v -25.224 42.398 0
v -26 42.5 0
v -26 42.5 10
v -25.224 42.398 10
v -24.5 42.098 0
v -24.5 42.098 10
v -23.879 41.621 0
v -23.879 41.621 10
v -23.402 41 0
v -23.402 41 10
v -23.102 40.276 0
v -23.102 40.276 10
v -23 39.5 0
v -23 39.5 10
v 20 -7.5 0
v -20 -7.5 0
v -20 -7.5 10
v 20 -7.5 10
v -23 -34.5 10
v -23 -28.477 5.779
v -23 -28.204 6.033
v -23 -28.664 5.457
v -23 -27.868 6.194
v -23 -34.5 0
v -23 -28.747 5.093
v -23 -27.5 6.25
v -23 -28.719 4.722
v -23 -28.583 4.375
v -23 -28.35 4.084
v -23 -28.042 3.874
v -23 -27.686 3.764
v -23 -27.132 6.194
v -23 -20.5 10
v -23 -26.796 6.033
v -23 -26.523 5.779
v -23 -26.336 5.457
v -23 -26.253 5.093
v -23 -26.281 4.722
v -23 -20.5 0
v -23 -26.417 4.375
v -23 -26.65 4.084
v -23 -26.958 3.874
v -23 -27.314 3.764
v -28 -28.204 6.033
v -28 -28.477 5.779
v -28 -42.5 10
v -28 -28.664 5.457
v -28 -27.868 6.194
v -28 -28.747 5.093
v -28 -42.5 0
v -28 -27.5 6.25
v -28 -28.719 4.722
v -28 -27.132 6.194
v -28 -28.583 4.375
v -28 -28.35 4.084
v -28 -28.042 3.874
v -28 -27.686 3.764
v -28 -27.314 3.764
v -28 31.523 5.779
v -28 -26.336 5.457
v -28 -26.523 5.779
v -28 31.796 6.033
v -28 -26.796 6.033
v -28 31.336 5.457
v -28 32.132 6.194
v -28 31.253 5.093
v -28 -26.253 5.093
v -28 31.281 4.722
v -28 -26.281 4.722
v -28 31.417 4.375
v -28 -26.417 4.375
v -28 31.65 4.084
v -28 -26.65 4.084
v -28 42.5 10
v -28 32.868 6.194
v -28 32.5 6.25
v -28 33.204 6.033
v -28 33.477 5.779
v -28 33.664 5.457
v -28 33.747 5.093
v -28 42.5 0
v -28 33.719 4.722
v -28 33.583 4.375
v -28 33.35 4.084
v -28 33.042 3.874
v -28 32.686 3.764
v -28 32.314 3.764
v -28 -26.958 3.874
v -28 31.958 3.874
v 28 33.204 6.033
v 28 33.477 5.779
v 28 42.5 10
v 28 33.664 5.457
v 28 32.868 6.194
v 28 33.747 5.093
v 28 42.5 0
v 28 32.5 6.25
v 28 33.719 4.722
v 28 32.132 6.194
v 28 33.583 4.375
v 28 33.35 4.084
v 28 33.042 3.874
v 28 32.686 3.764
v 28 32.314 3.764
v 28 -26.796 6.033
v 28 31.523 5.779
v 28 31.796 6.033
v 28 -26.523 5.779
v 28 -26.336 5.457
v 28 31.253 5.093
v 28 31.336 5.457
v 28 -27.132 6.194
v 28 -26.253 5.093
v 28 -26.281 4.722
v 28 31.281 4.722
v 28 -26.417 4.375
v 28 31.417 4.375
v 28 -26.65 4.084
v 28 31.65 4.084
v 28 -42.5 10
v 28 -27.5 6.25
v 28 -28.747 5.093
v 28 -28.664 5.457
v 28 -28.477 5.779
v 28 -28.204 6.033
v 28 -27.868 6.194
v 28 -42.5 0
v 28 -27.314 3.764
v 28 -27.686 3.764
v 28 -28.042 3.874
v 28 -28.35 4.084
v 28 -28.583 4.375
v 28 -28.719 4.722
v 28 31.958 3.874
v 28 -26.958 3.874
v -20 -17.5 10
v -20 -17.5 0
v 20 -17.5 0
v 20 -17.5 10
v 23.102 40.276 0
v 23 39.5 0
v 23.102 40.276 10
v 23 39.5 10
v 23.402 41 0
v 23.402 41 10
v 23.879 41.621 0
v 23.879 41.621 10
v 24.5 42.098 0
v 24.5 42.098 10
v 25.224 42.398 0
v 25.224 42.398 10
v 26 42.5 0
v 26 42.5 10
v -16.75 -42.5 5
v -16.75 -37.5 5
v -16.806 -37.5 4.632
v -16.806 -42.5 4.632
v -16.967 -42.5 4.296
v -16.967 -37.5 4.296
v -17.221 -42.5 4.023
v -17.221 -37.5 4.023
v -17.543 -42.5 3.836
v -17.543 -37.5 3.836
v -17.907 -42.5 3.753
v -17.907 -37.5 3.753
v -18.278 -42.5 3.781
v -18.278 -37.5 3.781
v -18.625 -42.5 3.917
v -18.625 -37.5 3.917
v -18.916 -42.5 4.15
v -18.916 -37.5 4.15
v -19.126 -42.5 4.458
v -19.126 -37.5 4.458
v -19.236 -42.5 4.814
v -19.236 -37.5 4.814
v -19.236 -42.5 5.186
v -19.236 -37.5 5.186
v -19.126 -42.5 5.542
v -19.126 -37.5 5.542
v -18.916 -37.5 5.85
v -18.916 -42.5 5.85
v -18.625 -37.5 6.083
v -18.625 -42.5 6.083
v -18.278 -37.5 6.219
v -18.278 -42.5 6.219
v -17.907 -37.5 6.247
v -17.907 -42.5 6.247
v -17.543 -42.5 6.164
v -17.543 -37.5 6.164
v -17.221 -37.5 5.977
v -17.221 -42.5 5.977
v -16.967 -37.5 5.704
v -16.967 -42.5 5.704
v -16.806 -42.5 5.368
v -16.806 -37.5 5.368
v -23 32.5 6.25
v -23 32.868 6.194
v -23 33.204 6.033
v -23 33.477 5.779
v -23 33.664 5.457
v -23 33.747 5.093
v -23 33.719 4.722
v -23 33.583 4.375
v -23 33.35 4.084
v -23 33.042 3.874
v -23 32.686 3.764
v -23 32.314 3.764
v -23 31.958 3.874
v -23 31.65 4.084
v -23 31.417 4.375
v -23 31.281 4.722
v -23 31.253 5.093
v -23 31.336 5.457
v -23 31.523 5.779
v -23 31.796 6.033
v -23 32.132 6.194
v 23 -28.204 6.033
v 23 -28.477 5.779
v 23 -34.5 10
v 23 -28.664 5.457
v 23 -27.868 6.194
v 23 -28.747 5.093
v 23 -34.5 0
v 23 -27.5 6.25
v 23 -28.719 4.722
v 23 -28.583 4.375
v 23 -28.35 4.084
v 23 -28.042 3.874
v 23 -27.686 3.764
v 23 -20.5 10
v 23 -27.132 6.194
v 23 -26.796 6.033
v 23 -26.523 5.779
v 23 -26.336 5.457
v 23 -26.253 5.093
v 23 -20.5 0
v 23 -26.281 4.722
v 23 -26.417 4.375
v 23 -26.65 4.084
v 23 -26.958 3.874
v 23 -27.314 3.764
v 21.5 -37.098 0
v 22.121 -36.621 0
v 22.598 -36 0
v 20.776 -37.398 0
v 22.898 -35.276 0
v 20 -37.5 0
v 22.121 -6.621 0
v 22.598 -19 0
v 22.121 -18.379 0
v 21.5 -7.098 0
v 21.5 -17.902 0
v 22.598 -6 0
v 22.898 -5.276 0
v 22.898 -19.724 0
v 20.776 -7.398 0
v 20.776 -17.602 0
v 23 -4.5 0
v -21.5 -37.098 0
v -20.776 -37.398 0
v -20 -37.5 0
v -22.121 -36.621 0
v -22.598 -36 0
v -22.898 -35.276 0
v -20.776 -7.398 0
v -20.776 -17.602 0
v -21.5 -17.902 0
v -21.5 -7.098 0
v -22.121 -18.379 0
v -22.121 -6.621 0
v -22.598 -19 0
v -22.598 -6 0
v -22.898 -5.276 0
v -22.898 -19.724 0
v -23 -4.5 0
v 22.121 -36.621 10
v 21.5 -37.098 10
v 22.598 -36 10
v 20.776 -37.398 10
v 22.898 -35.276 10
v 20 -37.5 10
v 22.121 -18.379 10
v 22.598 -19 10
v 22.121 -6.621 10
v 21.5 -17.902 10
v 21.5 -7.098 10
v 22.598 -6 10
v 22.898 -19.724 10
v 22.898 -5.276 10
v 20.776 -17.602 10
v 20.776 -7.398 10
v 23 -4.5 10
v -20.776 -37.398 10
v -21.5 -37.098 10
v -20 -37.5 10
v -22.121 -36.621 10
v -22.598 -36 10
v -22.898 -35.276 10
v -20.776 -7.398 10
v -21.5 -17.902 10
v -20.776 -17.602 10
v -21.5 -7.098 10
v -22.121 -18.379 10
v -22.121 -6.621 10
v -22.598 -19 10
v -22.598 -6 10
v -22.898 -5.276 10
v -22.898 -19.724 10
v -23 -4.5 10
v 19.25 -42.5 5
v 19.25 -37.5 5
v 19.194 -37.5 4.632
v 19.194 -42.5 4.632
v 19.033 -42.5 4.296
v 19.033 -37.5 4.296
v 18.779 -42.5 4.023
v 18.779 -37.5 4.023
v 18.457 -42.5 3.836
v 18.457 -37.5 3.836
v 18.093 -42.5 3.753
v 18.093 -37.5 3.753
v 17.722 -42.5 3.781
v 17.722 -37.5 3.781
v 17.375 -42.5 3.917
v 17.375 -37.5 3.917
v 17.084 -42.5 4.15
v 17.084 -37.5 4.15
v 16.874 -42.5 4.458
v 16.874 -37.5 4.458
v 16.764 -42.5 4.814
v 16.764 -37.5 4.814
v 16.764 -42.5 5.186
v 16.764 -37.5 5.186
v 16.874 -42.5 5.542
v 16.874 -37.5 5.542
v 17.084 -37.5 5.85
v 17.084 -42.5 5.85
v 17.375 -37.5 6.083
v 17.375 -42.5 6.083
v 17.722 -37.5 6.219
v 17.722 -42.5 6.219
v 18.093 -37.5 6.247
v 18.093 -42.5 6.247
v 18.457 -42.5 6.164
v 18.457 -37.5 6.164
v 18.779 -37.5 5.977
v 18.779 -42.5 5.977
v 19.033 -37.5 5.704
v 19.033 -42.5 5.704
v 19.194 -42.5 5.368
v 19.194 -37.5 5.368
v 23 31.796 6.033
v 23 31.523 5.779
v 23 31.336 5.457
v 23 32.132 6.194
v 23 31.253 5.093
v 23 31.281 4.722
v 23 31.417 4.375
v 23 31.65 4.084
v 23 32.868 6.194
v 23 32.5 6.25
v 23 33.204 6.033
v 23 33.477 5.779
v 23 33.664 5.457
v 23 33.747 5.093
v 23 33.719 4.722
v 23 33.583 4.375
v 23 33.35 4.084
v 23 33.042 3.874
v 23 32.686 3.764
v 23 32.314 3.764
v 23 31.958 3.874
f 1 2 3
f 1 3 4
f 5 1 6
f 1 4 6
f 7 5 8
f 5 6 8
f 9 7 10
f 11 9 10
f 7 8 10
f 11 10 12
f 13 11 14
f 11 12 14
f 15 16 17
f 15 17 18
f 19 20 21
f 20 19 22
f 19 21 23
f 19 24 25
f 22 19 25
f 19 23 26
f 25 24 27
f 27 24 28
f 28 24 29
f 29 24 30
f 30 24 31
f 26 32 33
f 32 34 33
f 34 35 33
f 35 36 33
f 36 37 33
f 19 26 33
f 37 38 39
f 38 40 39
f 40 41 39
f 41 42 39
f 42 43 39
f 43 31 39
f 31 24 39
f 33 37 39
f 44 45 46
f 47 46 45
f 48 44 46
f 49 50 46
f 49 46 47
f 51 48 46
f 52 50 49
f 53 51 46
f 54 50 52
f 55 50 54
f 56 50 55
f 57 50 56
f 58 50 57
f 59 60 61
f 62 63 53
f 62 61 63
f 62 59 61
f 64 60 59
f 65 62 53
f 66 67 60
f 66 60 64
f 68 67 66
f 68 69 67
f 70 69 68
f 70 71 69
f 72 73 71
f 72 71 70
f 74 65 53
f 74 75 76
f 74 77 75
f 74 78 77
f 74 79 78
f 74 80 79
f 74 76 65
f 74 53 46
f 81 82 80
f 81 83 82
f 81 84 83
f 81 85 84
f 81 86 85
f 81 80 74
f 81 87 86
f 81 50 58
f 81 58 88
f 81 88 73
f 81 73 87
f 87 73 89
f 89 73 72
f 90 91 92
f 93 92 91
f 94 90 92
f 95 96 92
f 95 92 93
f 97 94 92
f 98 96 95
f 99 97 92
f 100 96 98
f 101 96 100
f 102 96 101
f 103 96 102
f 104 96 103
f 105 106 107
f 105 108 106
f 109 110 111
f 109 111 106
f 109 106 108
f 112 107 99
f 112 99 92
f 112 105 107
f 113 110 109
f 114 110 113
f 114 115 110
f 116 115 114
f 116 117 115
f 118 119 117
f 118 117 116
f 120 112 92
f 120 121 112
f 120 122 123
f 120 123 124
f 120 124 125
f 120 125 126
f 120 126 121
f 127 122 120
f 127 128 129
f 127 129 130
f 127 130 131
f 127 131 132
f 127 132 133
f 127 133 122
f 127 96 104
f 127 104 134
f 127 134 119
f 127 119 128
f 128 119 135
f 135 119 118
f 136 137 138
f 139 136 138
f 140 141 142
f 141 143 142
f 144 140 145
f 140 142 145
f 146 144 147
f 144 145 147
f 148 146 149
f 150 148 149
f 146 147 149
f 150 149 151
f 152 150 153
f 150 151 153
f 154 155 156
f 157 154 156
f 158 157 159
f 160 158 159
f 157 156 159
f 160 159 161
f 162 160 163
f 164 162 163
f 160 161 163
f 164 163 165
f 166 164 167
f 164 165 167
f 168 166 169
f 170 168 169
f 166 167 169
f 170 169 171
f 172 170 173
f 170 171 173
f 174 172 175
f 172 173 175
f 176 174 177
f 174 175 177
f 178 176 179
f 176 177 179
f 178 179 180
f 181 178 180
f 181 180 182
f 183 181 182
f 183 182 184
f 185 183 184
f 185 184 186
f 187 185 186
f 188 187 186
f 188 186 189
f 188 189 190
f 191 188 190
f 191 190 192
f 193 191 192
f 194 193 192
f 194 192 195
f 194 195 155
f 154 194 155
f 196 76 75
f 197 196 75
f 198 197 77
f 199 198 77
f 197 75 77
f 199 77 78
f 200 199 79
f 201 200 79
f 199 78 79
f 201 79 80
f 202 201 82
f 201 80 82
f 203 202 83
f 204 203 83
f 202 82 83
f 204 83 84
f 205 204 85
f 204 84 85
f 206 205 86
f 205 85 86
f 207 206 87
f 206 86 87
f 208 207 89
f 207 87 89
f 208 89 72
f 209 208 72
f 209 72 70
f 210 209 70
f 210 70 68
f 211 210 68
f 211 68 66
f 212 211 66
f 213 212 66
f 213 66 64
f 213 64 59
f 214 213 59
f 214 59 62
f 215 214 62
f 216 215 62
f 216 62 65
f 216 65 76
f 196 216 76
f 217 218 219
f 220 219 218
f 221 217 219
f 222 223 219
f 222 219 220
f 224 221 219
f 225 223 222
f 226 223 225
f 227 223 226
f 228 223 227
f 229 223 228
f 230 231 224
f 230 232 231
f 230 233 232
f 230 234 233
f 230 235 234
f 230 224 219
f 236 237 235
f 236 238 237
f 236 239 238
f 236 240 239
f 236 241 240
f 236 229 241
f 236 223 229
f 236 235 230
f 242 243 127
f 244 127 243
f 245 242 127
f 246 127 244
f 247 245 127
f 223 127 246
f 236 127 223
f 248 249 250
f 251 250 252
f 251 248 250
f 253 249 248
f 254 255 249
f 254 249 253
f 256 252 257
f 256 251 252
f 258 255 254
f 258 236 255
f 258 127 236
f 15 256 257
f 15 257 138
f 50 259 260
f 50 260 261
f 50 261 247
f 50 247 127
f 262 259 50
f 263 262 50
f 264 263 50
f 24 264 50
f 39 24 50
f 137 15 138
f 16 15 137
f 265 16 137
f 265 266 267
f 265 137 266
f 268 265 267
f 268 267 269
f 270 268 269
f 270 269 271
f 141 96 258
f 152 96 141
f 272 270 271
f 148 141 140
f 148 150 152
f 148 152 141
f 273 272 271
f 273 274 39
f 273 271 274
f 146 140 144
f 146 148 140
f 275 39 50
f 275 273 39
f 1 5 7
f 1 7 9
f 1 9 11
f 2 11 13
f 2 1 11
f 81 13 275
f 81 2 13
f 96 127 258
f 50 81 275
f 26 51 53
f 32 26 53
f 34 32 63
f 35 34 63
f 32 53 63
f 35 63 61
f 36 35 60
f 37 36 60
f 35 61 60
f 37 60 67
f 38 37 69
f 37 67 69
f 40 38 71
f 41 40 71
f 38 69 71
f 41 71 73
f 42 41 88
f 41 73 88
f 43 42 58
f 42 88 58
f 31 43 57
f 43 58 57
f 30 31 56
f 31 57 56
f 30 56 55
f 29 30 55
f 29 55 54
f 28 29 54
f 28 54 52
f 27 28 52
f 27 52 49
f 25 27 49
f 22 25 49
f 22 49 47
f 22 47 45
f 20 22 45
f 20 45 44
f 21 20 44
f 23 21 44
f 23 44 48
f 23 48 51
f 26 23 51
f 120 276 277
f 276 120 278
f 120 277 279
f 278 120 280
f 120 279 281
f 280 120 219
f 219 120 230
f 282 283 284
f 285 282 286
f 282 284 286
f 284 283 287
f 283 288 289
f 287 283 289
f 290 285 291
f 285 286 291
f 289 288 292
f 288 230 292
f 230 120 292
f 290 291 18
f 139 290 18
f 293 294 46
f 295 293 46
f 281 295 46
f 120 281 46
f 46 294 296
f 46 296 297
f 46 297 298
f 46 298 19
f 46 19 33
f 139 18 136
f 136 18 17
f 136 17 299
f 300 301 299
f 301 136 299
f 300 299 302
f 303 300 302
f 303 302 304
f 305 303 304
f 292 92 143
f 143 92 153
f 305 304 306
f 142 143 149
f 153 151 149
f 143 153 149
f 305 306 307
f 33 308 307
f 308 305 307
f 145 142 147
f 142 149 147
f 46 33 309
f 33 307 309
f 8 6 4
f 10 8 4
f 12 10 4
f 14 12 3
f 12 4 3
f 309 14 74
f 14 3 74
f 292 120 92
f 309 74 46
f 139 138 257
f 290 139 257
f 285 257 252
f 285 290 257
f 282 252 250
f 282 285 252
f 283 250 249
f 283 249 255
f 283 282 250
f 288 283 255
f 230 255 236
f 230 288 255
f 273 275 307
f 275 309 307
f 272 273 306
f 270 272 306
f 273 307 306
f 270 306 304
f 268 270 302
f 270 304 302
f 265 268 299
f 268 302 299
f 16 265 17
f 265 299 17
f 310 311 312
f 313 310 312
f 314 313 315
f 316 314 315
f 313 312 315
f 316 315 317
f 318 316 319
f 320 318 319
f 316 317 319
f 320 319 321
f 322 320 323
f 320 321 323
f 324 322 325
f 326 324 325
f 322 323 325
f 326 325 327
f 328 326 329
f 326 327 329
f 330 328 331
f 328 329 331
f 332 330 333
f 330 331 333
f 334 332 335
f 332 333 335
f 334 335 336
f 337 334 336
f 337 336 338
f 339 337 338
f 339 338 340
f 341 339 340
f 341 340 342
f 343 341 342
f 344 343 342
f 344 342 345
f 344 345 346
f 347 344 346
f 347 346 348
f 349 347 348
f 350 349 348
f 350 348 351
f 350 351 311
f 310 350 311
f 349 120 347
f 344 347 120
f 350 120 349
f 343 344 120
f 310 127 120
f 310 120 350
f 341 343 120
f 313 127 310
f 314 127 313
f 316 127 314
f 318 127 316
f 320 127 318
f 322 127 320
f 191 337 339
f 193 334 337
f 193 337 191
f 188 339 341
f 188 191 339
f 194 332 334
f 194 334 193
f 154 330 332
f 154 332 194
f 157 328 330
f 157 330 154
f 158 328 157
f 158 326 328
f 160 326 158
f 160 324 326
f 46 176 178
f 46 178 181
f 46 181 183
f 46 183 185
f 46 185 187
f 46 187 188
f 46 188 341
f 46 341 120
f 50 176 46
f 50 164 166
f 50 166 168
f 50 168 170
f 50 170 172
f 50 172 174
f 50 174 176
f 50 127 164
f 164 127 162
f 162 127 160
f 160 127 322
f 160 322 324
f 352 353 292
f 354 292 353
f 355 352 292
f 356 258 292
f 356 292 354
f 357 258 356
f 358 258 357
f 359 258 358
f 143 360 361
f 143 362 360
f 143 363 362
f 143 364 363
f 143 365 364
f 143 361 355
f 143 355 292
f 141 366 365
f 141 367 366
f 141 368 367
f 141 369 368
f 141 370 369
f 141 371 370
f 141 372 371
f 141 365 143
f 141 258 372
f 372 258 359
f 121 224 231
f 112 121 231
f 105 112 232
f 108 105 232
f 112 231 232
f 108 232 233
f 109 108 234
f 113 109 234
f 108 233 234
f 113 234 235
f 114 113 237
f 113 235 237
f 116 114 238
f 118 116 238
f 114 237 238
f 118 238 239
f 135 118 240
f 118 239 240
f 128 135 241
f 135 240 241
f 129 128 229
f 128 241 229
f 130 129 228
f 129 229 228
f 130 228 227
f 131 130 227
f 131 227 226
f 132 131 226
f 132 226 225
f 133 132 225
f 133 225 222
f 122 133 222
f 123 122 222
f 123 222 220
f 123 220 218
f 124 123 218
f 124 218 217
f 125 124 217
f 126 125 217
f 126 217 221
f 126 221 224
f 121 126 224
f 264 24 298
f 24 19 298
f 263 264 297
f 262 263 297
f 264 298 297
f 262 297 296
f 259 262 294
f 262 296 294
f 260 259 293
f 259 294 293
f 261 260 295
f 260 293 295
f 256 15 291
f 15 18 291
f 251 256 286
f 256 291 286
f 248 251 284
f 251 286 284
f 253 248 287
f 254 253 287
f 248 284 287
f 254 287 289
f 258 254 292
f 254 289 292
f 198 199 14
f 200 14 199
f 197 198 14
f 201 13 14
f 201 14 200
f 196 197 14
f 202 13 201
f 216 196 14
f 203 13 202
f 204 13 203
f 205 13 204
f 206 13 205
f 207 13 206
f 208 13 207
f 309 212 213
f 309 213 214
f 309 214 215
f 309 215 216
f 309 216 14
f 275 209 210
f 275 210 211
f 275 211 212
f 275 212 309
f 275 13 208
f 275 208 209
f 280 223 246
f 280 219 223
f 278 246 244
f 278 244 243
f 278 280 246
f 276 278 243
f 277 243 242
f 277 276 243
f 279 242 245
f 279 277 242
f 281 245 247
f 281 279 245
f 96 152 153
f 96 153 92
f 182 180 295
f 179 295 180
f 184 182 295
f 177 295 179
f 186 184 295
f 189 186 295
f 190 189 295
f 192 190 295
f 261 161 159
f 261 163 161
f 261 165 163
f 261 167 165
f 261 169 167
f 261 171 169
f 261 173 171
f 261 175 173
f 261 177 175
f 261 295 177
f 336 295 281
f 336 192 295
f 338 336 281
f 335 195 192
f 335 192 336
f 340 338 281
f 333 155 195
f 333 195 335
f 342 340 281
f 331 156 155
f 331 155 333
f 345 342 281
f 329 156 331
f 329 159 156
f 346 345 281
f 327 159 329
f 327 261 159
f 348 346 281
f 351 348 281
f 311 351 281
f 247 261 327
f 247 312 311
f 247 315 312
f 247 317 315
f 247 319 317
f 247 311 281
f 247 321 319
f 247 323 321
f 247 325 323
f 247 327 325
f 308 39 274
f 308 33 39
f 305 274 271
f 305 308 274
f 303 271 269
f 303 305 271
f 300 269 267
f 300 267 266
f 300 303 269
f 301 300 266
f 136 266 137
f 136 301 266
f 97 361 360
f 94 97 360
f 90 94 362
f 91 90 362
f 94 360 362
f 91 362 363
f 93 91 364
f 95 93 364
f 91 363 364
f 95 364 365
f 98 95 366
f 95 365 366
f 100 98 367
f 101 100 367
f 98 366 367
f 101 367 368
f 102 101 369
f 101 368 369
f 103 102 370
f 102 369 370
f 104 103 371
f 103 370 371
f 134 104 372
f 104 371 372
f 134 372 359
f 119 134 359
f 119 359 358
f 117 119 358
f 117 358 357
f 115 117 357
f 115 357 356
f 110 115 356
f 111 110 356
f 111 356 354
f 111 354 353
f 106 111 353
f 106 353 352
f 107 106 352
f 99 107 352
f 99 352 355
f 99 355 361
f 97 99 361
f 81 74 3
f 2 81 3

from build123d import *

# Parameters (mm, degrees)
SKETCH_1_W      = 46
SKETCH_1_H      = 20
EXTRUDE_1_DEPTH = 10
FILLET_1_R      = 3
M3X0_51_D       = 2.5
M3X0_51_DEPTH   = 5
M3X0_52_D       = 2.5


with BuildPart() as part:
    # Эскиз1 → Бобышка-Вытянуть1 (new body)
    with BuildSketch(Plane.XY):
        Polygon((-28, 42.5), (-23, 42.5), (-23, -7.5), (23, -7.5), (23, 42.5), (28, 42.5), (28, -42.5), (-28, -42.5), align=None)
        with Locations((0, -27.5)):
            Rectangle(SKETCH_1_W, SKETCH_1_H, mode=Mode.SUBTRACT)
    extrude(amount=EXTRUDE_1_DEPTH)

    # Скругление1
    fillet_1_edges = [part.edges().sort_by_distance(p)[0] for p in [
        (-23, 42.5, 5),
        (-23, -7.5, 5),
        (23, -7.5, 5),
        (23, 42.5, 5),
        (23, -37.5, 5),
        (23, -17.5, 5),
        (-23, -17.5, 5),
        (-23, -37.5, 5),
    ]]
    fillet(fillet_1_edges, radius=FILLET_1_R)

    # Отверстие обработанное метчиком M3x0.51
    with Locations(Plane(origin=(0, -42.5, 0), x_dir=(-1, 0, 0), z_dir=(0, -1, 0))):
        with Locations((18, -5), (-18, -5)):
            Hole(M3X0_51_D / 2, depth=M3X0_51_DEPTH)

    # Отверстие обработанное метчиком M3x0.52 (through all)
    with Locations(Plane(origin=(28, 0, 0), x_dir=(0, 0, -1), z_dir=(1, 0, 0))):
        with Locations((-5, 32.5), (-5, -27.5)):
            Hole(M3X0_52_D / 2)


solid = part.part
